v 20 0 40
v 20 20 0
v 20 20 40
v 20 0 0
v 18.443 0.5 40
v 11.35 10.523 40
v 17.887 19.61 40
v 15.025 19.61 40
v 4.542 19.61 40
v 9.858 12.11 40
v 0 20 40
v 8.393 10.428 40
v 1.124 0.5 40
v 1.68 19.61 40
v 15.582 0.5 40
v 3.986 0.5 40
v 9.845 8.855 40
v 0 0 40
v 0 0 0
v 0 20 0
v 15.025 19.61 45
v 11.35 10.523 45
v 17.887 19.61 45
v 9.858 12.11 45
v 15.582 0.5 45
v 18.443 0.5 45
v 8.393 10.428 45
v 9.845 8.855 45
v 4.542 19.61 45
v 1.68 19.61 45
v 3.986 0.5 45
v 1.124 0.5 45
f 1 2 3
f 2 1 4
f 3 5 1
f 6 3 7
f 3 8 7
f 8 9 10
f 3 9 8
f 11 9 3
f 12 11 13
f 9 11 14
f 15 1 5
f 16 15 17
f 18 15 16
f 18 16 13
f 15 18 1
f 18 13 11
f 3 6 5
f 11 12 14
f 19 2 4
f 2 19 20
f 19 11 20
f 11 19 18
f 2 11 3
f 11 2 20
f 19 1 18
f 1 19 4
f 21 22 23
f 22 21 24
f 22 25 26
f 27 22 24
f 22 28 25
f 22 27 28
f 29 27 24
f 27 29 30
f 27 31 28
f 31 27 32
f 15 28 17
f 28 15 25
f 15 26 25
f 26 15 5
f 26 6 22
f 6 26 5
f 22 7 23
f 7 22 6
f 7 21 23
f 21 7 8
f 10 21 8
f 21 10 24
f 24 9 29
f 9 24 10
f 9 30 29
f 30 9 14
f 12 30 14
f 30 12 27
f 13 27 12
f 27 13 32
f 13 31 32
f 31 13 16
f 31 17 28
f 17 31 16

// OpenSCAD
cube([20, 20, 40]);
translate([0.5, 0.5, 40]){
    linear_extrude(5){
        text("X", size=20);
    }
}
